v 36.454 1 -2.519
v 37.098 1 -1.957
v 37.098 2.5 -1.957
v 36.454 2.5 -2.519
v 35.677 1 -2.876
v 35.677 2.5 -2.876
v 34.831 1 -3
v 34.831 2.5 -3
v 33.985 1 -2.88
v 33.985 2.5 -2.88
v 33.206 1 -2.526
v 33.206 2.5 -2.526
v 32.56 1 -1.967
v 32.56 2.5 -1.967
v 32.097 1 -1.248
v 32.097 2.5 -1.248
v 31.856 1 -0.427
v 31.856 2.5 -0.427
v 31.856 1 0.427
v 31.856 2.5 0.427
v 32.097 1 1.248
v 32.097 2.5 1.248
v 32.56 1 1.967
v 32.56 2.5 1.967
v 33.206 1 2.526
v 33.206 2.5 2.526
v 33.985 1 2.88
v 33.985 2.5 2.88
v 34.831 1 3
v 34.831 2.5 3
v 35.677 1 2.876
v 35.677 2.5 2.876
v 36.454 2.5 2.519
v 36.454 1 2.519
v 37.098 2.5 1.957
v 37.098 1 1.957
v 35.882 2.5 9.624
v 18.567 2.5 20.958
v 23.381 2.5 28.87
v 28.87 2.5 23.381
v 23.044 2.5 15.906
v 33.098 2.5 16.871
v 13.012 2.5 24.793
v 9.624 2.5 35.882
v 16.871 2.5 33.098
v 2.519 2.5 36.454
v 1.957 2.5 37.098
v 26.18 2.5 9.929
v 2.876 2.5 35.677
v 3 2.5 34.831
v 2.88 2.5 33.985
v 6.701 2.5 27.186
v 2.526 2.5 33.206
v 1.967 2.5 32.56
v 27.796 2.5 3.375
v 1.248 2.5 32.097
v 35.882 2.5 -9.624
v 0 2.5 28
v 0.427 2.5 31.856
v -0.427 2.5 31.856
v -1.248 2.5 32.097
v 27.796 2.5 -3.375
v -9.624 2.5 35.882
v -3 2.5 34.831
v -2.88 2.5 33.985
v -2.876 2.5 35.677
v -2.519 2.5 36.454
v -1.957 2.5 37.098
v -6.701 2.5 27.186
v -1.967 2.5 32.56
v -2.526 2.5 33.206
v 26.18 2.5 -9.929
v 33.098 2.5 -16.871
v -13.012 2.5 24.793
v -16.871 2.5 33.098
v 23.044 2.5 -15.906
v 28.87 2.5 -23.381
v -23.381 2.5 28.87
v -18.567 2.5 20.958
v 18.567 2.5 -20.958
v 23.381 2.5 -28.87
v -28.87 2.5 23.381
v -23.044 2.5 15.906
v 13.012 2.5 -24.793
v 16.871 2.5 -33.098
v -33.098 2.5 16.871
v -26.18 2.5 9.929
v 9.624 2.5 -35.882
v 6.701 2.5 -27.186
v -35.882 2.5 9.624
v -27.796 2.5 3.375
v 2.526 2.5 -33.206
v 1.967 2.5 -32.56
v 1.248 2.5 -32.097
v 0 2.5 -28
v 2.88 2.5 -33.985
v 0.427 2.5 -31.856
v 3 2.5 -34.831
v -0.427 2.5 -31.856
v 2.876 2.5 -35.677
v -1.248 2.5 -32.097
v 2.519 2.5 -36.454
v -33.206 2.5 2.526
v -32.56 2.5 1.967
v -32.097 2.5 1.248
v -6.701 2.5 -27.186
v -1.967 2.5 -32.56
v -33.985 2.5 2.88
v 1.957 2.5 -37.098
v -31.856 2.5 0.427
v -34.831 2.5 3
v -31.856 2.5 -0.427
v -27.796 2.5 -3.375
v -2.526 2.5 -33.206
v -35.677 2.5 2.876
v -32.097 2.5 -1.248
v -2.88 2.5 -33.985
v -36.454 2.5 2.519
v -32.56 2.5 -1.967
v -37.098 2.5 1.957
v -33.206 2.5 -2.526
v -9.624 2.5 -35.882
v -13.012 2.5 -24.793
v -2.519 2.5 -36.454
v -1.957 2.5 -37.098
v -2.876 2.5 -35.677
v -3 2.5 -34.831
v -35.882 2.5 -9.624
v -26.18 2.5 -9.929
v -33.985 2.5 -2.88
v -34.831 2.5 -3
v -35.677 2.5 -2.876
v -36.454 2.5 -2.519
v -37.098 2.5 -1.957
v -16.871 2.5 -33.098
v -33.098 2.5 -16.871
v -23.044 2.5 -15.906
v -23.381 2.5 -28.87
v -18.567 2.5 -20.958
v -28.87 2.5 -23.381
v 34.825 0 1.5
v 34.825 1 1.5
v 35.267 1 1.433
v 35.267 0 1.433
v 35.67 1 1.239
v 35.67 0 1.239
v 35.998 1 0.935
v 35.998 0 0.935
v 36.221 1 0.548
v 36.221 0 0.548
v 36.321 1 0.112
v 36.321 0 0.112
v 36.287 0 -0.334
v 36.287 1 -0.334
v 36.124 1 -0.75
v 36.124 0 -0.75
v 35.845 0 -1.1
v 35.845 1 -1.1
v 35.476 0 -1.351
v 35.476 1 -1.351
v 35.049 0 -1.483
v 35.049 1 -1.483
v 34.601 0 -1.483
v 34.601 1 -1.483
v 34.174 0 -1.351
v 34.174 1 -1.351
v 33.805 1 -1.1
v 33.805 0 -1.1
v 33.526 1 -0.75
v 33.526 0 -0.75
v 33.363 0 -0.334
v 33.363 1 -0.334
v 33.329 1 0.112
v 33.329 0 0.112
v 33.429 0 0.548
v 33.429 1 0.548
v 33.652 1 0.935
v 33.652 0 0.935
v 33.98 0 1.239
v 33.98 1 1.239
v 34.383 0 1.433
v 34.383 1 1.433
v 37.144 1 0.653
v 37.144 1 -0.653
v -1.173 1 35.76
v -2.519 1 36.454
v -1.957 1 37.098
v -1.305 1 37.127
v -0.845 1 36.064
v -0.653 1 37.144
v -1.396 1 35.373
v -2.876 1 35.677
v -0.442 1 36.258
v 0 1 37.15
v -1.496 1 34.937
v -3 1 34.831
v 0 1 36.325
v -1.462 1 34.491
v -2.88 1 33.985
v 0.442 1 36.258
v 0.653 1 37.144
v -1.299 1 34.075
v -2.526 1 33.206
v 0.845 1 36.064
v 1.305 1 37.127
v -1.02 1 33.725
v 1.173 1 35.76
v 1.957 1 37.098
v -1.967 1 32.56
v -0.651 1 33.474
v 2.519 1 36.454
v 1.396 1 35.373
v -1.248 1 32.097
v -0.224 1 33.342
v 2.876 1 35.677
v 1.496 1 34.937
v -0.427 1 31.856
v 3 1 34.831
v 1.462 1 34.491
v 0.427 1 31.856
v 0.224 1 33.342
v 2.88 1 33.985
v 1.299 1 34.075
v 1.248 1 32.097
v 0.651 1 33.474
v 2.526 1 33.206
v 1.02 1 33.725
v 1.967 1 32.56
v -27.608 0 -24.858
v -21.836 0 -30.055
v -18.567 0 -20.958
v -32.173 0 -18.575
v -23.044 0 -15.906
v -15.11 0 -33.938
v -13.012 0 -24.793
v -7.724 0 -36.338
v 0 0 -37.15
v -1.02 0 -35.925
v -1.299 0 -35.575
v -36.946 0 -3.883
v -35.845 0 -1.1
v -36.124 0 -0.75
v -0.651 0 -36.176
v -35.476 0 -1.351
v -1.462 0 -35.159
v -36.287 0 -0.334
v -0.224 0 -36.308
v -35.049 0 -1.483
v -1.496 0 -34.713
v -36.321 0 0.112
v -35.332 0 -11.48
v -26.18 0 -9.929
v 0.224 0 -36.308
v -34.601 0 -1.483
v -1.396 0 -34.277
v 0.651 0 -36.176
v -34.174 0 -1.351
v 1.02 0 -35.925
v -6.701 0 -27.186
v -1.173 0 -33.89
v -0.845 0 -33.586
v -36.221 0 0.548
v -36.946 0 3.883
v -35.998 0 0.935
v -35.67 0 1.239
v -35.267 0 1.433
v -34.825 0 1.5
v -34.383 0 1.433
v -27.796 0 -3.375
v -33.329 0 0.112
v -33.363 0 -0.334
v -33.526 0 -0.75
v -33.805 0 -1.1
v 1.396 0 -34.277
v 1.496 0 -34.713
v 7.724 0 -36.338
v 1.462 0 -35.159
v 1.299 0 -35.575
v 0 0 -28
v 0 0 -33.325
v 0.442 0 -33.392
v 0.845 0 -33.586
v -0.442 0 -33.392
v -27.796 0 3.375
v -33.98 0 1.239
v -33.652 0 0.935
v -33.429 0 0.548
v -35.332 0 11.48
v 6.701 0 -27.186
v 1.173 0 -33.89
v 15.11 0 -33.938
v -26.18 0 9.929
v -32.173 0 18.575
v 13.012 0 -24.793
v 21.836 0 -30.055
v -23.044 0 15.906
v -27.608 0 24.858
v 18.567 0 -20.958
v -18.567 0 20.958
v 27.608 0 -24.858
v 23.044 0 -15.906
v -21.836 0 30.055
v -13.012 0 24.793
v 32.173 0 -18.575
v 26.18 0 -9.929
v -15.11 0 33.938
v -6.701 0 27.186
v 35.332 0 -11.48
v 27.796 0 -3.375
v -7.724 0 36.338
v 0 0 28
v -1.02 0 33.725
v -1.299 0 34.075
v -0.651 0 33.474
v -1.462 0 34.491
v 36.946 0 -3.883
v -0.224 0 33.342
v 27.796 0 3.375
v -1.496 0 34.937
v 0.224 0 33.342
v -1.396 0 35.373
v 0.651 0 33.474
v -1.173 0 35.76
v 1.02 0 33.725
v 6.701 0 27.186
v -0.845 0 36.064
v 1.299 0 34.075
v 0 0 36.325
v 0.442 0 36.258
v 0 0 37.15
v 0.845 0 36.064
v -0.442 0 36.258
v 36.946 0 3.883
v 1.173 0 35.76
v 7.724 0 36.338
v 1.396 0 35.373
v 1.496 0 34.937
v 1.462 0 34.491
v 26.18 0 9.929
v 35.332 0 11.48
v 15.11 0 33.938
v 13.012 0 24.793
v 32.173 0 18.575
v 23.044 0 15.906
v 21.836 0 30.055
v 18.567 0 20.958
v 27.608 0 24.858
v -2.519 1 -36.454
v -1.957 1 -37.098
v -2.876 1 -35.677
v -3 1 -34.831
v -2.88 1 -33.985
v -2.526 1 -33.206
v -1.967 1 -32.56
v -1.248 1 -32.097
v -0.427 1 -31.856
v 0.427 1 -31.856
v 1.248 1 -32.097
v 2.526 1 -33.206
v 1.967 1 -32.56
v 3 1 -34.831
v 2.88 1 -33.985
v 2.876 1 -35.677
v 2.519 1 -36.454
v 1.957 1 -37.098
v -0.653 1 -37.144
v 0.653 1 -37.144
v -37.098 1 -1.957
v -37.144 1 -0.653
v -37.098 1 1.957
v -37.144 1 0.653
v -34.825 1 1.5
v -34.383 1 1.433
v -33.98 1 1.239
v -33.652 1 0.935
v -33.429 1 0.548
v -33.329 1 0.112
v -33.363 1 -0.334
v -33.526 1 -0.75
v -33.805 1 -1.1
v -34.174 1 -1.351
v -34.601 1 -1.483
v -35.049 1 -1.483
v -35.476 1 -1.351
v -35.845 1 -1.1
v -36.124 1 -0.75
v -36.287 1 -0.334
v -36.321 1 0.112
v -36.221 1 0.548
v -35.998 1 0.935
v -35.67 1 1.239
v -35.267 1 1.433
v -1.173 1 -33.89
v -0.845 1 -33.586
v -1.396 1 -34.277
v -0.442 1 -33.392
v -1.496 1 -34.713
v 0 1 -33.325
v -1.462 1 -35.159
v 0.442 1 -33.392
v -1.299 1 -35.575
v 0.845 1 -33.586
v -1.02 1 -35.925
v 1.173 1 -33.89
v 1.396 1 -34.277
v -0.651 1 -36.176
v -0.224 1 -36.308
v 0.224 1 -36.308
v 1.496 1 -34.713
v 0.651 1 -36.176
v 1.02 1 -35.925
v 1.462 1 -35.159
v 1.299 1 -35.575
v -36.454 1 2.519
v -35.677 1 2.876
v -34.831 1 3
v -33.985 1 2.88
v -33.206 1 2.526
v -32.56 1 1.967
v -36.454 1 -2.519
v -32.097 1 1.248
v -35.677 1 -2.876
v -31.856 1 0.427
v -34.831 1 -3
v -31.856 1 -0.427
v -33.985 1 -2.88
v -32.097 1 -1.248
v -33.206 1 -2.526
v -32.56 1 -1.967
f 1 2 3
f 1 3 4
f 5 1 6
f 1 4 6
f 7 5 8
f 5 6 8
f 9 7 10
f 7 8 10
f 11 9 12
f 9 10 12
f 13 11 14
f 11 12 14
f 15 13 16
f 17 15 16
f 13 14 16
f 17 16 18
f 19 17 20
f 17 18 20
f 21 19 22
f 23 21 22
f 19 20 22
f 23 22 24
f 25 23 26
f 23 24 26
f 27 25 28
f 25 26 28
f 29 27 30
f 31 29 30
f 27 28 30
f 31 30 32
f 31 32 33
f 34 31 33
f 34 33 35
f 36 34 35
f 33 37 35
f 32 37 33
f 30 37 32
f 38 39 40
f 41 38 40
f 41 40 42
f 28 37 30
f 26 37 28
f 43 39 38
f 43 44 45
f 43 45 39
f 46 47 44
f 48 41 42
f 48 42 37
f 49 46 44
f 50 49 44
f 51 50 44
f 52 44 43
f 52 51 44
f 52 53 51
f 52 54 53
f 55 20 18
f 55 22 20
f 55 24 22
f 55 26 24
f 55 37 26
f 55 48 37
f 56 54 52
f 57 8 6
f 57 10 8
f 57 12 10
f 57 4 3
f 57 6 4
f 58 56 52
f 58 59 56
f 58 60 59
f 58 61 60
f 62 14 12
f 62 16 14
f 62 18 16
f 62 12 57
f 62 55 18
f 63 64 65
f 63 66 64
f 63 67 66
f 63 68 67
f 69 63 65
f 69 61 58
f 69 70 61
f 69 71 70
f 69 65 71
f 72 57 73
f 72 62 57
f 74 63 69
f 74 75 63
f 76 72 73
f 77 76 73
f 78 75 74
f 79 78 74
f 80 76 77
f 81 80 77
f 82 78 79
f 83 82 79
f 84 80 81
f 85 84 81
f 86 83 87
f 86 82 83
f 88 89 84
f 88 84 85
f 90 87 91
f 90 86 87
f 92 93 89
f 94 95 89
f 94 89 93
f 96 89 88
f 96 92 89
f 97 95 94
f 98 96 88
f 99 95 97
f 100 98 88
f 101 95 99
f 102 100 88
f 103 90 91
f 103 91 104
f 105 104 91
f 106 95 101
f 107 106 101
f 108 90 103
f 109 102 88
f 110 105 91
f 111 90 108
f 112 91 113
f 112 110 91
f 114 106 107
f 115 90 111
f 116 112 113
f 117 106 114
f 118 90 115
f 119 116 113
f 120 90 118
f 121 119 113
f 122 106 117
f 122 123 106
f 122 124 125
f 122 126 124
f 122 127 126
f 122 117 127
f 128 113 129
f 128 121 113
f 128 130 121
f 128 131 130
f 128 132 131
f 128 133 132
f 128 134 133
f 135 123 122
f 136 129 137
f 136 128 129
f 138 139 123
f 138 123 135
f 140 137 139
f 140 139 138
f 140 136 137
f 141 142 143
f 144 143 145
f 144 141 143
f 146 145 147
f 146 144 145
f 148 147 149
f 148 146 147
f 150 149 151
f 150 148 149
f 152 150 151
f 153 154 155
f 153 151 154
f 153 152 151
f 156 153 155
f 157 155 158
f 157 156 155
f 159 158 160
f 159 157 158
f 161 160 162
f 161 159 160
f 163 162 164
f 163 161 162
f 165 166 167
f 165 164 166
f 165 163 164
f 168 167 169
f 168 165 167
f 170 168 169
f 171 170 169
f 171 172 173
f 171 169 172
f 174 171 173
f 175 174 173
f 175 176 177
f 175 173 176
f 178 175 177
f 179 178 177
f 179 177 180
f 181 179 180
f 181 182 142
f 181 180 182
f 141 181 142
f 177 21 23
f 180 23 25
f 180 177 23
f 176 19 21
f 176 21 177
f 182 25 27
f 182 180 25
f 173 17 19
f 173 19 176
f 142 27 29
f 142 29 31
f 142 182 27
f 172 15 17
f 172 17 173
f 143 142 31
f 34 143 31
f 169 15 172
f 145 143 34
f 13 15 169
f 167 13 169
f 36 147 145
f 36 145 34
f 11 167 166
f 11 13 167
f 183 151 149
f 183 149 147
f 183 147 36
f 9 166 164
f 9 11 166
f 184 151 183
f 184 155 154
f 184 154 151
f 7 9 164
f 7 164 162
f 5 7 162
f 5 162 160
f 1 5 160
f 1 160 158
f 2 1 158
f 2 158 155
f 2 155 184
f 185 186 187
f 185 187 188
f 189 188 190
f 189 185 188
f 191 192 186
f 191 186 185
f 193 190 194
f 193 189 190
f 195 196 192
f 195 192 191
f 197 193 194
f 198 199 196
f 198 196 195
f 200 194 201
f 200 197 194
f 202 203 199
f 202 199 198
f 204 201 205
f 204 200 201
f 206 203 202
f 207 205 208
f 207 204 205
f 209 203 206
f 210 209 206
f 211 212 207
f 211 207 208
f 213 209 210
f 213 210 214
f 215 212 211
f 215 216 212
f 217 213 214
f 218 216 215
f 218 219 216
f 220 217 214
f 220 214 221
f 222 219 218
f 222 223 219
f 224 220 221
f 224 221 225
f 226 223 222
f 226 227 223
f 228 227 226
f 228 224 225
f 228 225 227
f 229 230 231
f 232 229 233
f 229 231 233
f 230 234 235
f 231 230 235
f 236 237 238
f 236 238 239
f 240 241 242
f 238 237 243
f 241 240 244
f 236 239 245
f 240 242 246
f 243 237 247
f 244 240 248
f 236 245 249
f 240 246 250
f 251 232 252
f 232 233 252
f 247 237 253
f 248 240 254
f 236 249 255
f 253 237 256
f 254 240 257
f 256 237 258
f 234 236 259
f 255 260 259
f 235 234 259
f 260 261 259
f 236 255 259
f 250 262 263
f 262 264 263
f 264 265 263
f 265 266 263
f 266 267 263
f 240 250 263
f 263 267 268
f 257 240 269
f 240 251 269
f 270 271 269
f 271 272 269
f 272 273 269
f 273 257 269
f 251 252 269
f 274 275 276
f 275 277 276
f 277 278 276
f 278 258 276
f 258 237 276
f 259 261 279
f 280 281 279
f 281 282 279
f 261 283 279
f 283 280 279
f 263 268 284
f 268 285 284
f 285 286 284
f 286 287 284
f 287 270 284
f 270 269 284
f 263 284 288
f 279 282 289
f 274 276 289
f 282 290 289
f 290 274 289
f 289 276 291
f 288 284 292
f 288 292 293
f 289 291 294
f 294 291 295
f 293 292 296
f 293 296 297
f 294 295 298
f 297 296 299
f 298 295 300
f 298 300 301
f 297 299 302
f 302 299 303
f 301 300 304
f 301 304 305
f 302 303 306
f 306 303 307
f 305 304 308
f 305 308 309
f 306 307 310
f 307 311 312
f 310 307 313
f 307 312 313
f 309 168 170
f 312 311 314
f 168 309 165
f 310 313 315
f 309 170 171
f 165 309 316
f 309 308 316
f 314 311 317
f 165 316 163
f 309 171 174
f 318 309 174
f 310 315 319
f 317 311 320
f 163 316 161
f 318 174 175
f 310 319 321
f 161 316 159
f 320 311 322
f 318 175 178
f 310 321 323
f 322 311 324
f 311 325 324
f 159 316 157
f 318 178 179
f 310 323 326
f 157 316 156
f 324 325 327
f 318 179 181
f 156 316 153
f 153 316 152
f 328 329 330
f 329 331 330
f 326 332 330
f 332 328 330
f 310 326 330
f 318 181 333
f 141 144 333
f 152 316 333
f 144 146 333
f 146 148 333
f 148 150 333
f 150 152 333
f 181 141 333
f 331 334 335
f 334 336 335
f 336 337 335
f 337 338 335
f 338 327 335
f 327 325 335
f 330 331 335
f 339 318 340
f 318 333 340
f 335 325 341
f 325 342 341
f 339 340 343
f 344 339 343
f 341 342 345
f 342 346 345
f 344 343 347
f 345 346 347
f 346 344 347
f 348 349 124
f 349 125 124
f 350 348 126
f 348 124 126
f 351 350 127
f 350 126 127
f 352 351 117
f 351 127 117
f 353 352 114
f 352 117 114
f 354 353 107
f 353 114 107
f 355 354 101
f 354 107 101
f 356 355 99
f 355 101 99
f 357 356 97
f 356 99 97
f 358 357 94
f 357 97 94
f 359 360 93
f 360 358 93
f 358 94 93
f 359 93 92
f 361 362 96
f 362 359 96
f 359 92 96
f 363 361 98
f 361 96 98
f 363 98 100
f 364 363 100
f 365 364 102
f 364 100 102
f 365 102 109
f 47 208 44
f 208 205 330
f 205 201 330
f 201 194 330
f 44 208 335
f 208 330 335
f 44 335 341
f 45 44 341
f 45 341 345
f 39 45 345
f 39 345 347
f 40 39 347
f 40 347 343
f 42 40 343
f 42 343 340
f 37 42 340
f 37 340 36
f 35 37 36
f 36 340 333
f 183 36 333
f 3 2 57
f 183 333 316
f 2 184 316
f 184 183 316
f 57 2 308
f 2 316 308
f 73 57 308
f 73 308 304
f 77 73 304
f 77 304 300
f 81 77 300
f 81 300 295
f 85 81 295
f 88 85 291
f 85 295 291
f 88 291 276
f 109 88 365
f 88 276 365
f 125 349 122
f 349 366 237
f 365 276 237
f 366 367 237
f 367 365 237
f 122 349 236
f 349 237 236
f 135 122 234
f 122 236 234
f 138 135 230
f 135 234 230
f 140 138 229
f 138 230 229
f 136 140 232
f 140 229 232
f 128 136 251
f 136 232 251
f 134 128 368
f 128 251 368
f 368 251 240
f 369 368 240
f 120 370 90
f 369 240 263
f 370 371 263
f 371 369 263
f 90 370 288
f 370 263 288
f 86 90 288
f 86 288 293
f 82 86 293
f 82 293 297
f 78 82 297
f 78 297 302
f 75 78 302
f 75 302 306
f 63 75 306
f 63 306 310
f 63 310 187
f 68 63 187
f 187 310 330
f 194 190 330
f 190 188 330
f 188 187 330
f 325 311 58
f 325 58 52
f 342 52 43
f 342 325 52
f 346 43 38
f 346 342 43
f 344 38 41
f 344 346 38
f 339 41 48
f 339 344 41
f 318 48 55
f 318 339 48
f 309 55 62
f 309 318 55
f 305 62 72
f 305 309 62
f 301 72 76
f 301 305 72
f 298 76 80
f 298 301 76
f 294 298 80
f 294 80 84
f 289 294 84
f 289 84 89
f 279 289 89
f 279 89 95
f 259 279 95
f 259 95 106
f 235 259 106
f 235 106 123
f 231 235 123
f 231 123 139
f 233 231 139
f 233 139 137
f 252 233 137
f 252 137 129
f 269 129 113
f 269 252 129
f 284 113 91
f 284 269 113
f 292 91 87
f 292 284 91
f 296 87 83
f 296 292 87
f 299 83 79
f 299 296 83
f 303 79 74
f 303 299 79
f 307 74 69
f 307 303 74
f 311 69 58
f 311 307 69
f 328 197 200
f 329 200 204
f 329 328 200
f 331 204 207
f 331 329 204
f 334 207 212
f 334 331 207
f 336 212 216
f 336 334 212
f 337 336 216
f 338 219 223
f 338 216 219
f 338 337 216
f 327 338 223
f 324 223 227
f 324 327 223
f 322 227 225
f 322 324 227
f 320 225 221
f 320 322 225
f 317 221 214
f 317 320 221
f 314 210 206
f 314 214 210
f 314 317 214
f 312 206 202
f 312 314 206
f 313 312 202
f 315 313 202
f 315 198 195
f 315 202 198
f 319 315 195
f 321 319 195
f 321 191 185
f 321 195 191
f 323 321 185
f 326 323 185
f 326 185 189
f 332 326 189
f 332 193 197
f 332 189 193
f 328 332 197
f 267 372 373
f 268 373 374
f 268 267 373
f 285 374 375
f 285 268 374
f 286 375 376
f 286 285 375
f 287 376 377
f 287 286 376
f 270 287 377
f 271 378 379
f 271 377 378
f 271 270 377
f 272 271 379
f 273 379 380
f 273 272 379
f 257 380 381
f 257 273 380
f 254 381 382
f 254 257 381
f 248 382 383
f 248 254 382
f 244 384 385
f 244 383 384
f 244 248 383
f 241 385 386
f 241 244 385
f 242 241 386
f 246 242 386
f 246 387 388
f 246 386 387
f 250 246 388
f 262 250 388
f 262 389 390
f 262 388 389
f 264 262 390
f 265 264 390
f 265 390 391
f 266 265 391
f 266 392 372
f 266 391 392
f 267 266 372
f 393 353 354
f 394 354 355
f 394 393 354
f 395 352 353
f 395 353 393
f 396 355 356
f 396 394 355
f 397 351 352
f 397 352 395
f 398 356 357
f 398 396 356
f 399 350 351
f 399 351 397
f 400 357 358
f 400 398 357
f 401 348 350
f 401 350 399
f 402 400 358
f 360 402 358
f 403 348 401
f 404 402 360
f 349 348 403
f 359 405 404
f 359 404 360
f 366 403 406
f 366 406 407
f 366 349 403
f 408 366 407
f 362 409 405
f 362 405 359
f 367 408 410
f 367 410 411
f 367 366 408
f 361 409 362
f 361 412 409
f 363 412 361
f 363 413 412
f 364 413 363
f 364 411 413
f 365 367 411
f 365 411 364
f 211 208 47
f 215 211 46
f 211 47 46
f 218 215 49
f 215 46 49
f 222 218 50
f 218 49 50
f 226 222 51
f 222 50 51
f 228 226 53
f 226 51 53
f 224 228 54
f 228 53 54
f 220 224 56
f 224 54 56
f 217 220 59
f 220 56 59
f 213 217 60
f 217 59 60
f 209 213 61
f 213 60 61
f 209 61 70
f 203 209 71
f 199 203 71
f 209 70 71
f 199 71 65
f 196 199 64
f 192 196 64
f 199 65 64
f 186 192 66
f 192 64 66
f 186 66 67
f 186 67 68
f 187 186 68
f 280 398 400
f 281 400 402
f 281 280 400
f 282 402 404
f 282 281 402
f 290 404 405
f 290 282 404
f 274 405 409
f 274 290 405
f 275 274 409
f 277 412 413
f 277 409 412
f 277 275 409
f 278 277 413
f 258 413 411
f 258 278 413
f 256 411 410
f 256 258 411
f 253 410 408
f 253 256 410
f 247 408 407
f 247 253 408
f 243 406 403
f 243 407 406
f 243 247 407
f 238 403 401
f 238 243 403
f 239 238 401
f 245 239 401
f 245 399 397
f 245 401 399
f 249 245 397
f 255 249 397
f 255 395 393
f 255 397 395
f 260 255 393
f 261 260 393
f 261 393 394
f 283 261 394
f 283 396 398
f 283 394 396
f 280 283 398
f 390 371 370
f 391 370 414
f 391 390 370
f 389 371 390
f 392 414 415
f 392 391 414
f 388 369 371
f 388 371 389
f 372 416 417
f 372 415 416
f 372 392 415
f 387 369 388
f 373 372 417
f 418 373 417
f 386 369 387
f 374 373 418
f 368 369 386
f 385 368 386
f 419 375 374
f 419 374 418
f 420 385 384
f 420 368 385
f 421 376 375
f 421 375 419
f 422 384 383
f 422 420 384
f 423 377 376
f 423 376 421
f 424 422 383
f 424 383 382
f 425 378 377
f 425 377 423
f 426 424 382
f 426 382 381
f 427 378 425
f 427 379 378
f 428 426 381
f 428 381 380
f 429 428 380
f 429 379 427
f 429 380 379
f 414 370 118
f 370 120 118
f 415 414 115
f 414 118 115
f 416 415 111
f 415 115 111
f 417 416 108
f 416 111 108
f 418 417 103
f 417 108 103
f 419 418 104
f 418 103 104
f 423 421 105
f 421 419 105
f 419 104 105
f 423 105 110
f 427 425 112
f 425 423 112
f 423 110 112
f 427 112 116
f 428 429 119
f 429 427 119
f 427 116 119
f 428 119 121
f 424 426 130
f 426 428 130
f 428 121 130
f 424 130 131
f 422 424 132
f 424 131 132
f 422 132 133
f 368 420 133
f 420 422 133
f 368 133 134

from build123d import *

# Parameters (mm, degrees)
SKETCH_1_R          = 37.15
SKETCH_1_R_2        = 28
SKETCH_1_R_3        = 1.5
EXTRUDE_1_DEPTH     = 3
SKETCH_3_R          = 3
CUT_EXTRUDE_1_DEPTH = 2
CUT_EXTRUDE_START   = -0.5
SKETCH_4_R          = 37.15
CUT_EXTRUDE_2_DEPTH = 0.5


with BuildPart() as part:
    # 草图1 → 凸台-拉伸1 (new body)
    with BuildSketch(Plane(origin=(0, 0, 0), x_dir=(1, 0, 0), z_dir=(0, 1, 0))):
        with Locations(Location((0, 0, 0), (0, 0, 270))):
            Circle(SKETCH_1_R)
        with Locations(Location((0, 0, 0), (0, 0, 270))):
            Circle(SKETCH_1_R_2, mode=Mode.SUBTRACT)
        with Locations(Location((0, 34.825, 0), (0, 0, 270))):
            Circle(SKETCH_1_R_3, mode=Mode.SUBTRACT)
        with Locations(Location((-34.825, 0, 0), (0, 0, 270))):
            Circle(SKETCH_1_R_3, mode=Mode.SUBTRACT)
        with Locations(Location((0, -34.825, 0), (0, 0, 270))):
            Circle(SKETCH_1_R_3, mode=Mode.SUBTRACT)
        with Locations(Location((34.825, 0, 0), (0, 0, 270))):
            Circle(SKETCH_1_R_3, mode=Mode.SUBTRACT)
    extrude(amount=EXTRUDE_1_DEPTH)

    # 草图3 → 切除-拉伸1 (cut)
    with BuildSketch(Plane(origin=(0, 3, 0), x_dir=(1, 0, 0), z_dir=(0, 1, 0))):
        with Locations((0, 34.825)):
            Circle(SKETCH_3_R)
        with Locations((-34.825, 0)):
            Circle(SKETCH_3_R)
        with Locations((0, -34.825)):
            Circle(SKETCH_3_R)
        with Locations((34.825, 0)):
            Circle(SKETCH_3_R)
    extrude(amount=-CUT_EXTRUDE_1_DEPTH, mode=Mode.SUBTRACT)

    # 草图4 → 切除-拉伸2 (cut)
    with BuildSketch(Plane(origin=(0, 3, 0), x_dir=(1, 0, 0), z_dir=(0, 1, 0)).offset(CUT_EXTRUDE_START)):
        with Locations(Location((0, 0, 0), (0, 0, 93.02036647))):
            Circle(SKETCH_4_R)
    extrude(amount=CUT_EXTRUDE_2_DEPTH, mode=Mode.SUBTRACT)


solid = part.part
